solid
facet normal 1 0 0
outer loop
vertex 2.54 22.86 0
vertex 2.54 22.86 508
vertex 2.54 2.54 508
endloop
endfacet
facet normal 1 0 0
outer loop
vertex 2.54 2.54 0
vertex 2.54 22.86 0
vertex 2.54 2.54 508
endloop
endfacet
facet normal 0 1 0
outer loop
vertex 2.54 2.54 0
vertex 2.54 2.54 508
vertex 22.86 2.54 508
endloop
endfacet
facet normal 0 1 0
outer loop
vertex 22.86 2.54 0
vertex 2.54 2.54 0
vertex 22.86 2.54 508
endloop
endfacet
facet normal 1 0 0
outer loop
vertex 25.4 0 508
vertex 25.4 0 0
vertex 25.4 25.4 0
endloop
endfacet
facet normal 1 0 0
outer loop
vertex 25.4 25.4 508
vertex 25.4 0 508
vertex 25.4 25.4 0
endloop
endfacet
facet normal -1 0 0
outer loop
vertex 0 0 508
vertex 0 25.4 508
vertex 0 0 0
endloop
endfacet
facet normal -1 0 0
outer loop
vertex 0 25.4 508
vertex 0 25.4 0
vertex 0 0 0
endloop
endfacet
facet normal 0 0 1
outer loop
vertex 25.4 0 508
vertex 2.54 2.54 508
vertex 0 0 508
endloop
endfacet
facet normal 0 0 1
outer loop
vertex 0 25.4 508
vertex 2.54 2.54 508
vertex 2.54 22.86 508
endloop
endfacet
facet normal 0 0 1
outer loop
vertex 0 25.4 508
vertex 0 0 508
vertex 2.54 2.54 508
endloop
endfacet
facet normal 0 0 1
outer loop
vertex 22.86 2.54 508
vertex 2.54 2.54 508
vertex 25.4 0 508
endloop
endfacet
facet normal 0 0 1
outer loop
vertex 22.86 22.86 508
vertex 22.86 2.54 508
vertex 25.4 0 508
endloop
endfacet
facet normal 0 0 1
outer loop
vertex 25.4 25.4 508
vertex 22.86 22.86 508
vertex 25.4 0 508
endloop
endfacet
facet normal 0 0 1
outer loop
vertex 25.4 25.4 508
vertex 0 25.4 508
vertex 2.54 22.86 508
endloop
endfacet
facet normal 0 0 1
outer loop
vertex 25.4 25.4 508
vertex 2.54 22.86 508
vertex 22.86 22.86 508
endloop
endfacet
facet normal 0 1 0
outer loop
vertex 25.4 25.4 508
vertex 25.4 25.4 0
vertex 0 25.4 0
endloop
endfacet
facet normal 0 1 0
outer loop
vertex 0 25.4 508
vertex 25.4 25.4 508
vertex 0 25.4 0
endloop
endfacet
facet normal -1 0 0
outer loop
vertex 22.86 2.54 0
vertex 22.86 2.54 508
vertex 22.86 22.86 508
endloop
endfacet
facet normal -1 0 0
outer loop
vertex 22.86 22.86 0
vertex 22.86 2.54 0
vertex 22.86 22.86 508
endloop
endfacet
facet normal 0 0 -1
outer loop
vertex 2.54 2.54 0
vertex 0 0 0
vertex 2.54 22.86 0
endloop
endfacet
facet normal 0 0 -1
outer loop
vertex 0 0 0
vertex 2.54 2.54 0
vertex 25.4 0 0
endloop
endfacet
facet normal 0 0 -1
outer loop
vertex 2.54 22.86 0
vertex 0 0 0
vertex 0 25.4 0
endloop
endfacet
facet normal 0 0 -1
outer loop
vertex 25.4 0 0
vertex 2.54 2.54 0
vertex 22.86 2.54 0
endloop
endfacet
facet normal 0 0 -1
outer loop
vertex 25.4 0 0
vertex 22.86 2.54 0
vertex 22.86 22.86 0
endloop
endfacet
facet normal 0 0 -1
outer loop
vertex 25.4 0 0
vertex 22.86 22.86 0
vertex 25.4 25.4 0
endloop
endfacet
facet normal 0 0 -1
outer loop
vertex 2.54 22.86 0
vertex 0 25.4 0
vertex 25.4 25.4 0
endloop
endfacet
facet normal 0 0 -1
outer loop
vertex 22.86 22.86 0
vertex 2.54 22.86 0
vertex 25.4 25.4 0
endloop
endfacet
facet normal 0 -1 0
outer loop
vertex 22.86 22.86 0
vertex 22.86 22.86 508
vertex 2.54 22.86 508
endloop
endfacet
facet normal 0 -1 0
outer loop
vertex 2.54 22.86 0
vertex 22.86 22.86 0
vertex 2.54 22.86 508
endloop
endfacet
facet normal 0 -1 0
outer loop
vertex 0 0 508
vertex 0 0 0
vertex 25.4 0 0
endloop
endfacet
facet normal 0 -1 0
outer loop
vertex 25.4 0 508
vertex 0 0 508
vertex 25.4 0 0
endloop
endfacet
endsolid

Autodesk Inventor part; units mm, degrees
ref_plane "YZ Plane" through (0, 0, 0) normal (1, 0, 0) x (0, 1, 0)
ref_plane "XZ Plane" through (0, 0, 0) normal (0, 1, 0) x (-1, 0, 0)
ref_plane "XY Plane" through (0, 0, 0) normal (0, 0, 1) x (1, 0, 0)
sketch "Sketch1" plane through (0, 0, 0) normal (0, 0, 1) x (1, 0, 0)
  line L0 (0, 0) -> (25.4, 0)
  line L1 (25.4, 0) -> (25.4, 25.4)
  line L2 (25.4, 25.4) -> (0, 25.4)
  line L3 (0, 25.4) -> (0, 0)
  dimension "d0" = 25.4
  dimension "d1" = 25.4
extrude "Extrusion1" add sketch "Sketch1" along normal blind 508
shell "Shell1" thickness 2.54 removed faces 2 at (8.4667, 16.9333, 0) at (8.4667, 16.9333, 508)
properties part number "22in"
